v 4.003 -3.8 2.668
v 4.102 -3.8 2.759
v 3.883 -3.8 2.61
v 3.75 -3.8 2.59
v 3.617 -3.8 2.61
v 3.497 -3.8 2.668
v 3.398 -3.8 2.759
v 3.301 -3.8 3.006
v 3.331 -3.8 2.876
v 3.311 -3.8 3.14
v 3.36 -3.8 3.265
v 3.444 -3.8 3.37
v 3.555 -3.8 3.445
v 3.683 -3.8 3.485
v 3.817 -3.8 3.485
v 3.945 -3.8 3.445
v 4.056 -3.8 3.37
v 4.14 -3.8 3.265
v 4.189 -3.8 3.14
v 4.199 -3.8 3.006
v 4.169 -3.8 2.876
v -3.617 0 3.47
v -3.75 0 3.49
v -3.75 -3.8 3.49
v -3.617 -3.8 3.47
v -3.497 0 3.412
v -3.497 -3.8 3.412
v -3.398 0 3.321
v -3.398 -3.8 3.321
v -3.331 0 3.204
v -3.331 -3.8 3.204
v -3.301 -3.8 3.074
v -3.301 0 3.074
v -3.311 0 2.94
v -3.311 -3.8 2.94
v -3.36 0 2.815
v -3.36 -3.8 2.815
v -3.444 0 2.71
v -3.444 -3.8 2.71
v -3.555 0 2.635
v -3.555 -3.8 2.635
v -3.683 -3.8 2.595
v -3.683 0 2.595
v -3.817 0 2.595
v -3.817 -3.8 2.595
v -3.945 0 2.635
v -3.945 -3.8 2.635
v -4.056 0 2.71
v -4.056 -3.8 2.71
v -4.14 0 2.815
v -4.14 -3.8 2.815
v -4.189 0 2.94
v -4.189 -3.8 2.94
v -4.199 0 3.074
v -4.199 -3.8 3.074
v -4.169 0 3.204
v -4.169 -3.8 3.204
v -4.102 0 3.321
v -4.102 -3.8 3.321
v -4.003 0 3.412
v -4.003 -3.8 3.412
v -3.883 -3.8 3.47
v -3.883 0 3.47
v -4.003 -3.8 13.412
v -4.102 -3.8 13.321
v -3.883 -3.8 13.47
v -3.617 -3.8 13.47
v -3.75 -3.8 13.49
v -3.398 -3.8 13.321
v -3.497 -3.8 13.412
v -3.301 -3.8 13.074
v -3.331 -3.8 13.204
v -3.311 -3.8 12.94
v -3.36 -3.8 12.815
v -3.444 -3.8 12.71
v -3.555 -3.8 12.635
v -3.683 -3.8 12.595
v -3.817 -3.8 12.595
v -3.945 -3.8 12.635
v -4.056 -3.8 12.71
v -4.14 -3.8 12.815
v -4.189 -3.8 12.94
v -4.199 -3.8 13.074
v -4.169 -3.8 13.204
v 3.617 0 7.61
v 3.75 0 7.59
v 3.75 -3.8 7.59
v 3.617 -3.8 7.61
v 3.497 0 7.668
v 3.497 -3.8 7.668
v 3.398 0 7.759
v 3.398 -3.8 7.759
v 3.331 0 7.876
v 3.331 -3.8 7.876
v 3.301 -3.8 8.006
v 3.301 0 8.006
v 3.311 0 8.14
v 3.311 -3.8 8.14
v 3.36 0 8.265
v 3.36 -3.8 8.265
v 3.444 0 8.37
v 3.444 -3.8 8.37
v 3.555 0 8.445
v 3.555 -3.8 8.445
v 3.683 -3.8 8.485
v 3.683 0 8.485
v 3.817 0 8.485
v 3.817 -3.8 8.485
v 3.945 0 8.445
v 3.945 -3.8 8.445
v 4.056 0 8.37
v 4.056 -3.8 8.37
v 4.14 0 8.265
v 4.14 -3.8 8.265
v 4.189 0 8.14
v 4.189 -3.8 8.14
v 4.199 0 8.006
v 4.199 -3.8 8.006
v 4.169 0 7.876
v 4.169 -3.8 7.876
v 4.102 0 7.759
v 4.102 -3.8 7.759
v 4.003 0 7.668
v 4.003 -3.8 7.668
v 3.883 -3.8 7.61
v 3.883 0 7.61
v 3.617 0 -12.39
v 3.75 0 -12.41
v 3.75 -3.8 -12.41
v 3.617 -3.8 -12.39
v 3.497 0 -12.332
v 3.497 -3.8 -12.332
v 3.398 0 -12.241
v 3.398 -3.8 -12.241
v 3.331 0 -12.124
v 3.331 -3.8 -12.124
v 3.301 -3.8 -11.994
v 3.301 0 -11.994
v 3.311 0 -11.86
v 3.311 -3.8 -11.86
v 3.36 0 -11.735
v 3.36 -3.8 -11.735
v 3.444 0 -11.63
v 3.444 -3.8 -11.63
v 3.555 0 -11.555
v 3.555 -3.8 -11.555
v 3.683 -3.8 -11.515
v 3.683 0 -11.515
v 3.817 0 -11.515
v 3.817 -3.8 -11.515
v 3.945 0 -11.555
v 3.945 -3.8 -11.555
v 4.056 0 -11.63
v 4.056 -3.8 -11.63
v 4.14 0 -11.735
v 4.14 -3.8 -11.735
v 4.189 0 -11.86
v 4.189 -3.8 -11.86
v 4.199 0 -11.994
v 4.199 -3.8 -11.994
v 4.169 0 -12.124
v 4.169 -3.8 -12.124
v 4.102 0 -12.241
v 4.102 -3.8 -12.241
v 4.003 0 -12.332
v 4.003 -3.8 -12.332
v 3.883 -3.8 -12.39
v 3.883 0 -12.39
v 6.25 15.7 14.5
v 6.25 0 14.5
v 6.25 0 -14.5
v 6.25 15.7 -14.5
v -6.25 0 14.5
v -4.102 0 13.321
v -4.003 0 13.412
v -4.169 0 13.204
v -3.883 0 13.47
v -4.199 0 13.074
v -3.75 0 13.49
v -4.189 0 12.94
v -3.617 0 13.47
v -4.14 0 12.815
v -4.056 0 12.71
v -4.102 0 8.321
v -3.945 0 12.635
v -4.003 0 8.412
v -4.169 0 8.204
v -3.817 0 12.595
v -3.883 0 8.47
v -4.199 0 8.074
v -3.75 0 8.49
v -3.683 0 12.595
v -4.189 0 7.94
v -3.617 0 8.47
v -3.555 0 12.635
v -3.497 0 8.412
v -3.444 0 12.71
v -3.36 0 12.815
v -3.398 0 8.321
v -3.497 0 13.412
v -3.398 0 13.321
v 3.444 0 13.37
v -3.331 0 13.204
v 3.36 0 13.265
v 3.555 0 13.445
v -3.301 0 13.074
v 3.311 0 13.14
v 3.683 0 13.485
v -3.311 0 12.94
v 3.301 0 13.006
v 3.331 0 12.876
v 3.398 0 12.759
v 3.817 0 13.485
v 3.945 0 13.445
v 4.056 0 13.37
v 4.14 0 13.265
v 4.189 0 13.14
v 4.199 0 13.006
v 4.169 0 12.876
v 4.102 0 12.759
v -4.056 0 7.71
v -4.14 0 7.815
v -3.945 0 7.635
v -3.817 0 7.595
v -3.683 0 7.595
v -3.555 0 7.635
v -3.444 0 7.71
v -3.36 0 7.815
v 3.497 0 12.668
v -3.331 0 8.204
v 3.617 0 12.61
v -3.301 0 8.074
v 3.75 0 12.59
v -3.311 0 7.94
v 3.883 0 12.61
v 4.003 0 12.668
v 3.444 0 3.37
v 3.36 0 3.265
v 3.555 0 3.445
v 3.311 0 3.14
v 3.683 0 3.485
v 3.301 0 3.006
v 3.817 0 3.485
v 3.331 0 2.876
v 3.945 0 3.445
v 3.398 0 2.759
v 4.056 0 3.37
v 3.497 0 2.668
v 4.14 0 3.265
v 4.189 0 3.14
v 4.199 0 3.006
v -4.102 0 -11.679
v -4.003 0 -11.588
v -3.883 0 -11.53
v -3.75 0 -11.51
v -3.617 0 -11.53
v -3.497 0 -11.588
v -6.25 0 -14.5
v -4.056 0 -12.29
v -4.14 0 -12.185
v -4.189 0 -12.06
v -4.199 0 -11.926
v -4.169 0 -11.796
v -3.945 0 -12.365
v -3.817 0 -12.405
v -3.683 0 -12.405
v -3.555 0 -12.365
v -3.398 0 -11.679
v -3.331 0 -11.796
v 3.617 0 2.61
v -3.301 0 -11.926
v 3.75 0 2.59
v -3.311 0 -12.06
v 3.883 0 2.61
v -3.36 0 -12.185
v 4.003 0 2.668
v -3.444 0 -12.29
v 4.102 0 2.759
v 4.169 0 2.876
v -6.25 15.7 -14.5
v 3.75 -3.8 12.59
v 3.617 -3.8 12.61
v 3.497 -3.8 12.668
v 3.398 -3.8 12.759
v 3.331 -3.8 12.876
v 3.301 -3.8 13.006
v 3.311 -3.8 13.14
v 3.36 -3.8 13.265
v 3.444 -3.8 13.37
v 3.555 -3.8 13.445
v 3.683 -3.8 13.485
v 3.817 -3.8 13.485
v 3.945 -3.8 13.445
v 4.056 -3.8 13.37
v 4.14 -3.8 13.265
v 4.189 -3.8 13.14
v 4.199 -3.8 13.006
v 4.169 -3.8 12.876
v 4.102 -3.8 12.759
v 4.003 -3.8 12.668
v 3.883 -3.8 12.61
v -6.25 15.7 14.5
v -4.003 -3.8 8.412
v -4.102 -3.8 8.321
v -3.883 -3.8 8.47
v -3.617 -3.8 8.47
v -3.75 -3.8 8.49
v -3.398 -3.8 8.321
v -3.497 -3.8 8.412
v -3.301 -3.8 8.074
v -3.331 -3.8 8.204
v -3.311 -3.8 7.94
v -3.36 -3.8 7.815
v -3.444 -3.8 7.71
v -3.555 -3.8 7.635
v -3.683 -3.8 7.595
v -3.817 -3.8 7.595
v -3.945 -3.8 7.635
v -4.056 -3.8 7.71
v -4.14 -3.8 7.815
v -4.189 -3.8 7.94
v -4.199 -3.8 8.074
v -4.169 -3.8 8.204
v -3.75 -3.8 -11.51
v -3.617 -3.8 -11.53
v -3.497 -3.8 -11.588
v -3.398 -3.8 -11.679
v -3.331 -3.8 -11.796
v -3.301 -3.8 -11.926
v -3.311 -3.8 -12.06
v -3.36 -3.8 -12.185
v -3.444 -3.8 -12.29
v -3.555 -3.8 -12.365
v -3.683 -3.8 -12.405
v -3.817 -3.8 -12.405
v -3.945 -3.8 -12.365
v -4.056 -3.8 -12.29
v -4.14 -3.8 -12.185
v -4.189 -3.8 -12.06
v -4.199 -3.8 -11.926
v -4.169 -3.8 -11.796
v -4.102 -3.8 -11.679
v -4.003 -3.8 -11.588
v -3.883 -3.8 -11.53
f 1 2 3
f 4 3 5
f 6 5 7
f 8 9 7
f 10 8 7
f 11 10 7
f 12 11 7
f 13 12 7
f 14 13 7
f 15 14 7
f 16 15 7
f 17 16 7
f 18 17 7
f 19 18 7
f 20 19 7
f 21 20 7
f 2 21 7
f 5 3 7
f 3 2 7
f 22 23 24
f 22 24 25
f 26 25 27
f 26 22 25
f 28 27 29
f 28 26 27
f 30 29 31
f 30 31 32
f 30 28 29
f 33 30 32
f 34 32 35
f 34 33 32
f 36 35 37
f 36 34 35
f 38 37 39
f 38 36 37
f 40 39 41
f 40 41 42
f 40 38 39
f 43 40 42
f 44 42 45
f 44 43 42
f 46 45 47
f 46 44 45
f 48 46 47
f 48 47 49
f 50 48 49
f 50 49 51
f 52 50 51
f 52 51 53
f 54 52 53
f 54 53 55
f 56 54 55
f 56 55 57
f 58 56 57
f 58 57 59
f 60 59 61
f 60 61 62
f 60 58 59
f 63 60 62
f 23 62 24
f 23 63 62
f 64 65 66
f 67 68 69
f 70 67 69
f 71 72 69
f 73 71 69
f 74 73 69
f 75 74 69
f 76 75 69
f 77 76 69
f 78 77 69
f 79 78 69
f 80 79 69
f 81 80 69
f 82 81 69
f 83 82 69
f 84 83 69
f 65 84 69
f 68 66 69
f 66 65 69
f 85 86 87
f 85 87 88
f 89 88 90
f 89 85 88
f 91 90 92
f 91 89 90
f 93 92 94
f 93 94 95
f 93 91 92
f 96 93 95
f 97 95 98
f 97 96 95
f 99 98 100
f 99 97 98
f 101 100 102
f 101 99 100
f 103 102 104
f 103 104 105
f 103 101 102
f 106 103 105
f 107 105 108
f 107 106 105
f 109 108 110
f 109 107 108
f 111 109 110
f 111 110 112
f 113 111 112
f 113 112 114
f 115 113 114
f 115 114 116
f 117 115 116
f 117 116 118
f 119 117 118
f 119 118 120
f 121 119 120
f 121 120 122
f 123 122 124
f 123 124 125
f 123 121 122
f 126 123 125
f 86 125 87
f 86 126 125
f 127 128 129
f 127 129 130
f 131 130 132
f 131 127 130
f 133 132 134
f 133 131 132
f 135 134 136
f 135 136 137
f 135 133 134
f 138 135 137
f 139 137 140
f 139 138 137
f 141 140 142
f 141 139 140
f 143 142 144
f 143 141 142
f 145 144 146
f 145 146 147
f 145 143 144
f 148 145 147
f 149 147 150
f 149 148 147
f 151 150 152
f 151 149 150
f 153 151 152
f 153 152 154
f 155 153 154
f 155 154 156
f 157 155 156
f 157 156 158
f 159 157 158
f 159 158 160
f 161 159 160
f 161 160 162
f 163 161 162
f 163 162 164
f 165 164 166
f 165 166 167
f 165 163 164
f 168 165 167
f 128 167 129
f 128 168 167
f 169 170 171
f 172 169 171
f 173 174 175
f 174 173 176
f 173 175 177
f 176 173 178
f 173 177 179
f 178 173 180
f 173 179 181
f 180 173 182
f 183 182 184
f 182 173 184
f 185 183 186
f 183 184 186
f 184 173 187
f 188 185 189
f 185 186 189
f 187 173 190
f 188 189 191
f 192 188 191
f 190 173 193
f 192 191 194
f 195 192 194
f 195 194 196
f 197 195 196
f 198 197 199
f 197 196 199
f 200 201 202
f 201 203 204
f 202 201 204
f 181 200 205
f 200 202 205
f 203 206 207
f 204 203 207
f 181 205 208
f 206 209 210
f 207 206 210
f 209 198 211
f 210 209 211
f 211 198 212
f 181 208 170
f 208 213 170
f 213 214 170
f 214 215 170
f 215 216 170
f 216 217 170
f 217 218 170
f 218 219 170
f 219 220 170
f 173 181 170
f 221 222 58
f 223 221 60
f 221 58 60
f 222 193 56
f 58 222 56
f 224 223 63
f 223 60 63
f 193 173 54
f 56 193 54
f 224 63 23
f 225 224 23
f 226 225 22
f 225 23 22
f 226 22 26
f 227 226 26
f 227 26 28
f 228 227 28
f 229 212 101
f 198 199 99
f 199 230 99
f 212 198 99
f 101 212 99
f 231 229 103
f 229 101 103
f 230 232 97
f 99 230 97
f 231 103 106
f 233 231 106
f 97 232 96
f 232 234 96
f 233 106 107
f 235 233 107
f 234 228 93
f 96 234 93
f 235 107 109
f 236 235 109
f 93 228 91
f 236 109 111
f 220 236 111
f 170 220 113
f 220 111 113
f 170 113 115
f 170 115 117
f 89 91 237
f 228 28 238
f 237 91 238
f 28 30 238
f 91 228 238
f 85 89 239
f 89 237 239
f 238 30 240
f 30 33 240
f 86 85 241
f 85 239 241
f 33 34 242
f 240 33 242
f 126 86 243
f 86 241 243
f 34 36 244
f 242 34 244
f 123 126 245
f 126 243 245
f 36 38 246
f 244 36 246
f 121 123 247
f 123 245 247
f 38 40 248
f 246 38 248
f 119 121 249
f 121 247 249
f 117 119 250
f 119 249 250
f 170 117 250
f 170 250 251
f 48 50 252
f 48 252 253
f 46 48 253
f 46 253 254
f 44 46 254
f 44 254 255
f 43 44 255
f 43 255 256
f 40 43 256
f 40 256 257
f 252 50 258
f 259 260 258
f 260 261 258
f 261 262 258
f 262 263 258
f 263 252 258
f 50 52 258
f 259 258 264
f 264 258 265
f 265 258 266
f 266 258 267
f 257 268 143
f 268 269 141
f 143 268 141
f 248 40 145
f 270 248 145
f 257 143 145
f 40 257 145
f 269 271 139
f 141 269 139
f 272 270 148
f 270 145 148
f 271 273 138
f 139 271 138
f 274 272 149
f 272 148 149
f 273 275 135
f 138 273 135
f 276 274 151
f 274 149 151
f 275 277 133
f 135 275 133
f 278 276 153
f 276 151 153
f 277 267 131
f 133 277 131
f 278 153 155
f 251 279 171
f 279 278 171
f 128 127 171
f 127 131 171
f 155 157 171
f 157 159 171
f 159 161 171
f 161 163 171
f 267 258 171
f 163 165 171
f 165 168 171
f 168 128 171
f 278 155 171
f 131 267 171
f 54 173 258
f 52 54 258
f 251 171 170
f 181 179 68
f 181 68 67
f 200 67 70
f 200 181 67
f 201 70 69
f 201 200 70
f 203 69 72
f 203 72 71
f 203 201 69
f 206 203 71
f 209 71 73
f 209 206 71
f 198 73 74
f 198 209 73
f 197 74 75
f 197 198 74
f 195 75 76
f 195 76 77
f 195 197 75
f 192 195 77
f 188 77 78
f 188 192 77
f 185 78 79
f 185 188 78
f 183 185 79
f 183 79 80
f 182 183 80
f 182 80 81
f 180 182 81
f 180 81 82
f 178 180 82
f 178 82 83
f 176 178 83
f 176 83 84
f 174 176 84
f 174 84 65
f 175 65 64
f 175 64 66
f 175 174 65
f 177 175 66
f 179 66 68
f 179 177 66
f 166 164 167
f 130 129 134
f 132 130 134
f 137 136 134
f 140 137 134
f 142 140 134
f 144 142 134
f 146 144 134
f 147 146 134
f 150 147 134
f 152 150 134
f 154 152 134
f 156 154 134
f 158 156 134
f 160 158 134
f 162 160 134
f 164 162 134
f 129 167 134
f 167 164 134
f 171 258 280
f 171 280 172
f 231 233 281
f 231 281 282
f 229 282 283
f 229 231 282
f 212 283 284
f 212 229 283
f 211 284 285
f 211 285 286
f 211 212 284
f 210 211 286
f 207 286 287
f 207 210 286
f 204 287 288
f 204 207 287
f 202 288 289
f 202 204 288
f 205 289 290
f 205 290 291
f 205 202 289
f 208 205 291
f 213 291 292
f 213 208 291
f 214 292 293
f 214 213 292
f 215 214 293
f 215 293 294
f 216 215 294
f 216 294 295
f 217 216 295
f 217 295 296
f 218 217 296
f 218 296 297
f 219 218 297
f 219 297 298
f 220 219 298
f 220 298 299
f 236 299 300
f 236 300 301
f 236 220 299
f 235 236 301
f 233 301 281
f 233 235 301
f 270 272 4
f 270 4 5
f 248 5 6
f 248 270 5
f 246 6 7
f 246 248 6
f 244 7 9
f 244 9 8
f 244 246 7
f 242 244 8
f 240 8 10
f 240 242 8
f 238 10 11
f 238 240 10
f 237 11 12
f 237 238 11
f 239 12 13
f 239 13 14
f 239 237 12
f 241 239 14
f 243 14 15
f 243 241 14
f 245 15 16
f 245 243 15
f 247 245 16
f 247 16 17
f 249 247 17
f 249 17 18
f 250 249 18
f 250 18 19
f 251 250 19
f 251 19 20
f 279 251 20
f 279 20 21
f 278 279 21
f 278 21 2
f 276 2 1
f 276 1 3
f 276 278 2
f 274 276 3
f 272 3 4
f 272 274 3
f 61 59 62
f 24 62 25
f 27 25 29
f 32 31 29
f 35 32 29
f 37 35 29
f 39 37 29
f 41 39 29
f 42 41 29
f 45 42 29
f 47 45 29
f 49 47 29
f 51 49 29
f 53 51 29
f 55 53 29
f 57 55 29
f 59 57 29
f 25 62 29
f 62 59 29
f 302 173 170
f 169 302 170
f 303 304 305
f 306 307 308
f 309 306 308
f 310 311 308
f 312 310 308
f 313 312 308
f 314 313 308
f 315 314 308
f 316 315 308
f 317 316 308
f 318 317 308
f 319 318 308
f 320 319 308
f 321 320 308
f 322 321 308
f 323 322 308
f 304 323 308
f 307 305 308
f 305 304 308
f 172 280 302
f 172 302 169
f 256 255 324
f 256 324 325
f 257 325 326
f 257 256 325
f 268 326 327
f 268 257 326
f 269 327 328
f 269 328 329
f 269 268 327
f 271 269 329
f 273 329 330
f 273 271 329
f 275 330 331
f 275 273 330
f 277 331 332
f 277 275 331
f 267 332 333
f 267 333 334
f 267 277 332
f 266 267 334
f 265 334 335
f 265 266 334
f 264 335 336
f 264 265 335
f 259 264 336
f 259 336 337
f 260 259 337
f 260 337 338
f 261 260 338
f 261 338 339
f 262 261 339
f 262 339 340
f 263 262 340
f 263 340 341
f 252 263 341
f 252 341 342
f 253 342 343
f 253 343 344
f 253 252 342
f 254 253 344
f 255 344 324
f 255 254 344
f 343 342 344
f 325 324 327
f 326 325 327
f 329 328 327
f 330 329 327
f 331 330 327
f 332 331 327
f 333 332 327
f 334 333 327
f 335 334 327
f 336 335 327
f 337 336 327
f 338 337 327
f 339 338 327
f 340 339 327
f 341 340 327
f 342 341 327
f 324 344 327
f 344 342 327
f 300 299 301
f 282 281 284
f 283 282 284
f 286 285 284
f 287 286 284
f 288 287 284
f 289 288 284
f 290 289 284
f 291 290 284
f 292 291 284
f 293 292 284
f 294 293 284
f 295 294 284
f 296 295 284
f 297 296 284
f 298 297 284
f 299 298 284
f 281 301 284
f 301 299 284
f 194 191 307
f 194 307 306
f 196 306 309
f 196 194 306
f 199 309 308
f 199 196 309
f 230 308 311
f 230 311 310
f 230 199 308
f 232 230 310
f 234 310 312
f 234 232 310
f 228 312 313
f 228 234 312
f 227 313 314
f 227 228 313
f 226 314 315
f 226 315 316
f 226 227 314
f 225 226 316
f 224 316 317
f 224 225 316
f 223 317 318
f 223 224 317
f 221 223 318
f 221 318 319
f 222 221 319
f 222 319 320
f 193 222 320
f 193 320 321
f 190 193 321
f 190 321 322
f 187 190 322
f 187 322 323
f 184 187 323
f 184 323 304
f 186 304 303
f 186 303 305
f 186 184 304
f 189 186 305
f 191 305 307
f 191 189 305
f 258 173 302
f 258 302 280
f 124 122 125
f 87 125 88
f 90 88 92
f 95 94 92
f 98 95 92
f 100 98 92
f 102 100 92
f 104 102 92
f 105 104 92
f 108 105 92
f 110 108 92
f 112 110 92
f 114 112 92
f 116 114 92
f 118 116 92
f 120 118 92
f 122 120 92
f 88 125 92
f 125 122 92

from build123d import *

# Parameters (mm, degrees)
SKETCH1_W           = 12.5
SKETCH1_H           = 29
BOSS_EXTRUDE1_DEPTH = 15.7
SKETCH2_R           = 0.45
BOSS_EXTRUDE2_DEPTH = 3.8


with BuildPart() as part:
    # Sketch1 → Boss-Extrude1 (new body)
    with BuildSketch(Plane(origin=(0, 0, 0), x_dir=(1, 0, 0), z_dir=(0, 1, 0))):
        Rectangle(SKETCH1_W, SKETCH1_H)
    extrude(amount=BOSS_EXTRUDE1_DEPTH)

    # Sketch2 → Boss-Extrude2 (add)
    with BuildSketch(Plane(origin=(0, 0, 0), x_dir=(1, 0, 0), z_dir=(0, 1, 0))):
        with Locations(Location((-3.75, -13.04, 0), (0, 0, 270))):
            Circle(SKETCH2_R)
        with Locations(Location((-3.75, -8.04, 0), (0, 0, 270))):
            Circle(SKETCH2_R)
        with Locations(Location((-3.75, -3.04, 0), (0, 0, 270))):
            Circle(SKETCH2_R)
        with Locations(Location((-3.75, 11.96, 0), (0, 0, 270))):
            Circle(SKETCH2_R)
        with Locations(Location((3.75, 11.96, 0), (0, 0, 90))):
            Circle(SKETCH2_R)
        with Locations(Location((3.75, -3.04, 0), (0, 0, 90))):
            Circle(SKETCH2_R)
        with Locations(Location((3.75, -8.04, 0), (0, 0, 90))):
            Circle(SKETCH2_R)
        with Locations(Location((3.75, -13.04, 0), (0, 0, 90))):
            Circle(SKETCH2_R)
    extrude(amount=-BOSS_EXTRUDE2_DEPTH)


solid = part.part
